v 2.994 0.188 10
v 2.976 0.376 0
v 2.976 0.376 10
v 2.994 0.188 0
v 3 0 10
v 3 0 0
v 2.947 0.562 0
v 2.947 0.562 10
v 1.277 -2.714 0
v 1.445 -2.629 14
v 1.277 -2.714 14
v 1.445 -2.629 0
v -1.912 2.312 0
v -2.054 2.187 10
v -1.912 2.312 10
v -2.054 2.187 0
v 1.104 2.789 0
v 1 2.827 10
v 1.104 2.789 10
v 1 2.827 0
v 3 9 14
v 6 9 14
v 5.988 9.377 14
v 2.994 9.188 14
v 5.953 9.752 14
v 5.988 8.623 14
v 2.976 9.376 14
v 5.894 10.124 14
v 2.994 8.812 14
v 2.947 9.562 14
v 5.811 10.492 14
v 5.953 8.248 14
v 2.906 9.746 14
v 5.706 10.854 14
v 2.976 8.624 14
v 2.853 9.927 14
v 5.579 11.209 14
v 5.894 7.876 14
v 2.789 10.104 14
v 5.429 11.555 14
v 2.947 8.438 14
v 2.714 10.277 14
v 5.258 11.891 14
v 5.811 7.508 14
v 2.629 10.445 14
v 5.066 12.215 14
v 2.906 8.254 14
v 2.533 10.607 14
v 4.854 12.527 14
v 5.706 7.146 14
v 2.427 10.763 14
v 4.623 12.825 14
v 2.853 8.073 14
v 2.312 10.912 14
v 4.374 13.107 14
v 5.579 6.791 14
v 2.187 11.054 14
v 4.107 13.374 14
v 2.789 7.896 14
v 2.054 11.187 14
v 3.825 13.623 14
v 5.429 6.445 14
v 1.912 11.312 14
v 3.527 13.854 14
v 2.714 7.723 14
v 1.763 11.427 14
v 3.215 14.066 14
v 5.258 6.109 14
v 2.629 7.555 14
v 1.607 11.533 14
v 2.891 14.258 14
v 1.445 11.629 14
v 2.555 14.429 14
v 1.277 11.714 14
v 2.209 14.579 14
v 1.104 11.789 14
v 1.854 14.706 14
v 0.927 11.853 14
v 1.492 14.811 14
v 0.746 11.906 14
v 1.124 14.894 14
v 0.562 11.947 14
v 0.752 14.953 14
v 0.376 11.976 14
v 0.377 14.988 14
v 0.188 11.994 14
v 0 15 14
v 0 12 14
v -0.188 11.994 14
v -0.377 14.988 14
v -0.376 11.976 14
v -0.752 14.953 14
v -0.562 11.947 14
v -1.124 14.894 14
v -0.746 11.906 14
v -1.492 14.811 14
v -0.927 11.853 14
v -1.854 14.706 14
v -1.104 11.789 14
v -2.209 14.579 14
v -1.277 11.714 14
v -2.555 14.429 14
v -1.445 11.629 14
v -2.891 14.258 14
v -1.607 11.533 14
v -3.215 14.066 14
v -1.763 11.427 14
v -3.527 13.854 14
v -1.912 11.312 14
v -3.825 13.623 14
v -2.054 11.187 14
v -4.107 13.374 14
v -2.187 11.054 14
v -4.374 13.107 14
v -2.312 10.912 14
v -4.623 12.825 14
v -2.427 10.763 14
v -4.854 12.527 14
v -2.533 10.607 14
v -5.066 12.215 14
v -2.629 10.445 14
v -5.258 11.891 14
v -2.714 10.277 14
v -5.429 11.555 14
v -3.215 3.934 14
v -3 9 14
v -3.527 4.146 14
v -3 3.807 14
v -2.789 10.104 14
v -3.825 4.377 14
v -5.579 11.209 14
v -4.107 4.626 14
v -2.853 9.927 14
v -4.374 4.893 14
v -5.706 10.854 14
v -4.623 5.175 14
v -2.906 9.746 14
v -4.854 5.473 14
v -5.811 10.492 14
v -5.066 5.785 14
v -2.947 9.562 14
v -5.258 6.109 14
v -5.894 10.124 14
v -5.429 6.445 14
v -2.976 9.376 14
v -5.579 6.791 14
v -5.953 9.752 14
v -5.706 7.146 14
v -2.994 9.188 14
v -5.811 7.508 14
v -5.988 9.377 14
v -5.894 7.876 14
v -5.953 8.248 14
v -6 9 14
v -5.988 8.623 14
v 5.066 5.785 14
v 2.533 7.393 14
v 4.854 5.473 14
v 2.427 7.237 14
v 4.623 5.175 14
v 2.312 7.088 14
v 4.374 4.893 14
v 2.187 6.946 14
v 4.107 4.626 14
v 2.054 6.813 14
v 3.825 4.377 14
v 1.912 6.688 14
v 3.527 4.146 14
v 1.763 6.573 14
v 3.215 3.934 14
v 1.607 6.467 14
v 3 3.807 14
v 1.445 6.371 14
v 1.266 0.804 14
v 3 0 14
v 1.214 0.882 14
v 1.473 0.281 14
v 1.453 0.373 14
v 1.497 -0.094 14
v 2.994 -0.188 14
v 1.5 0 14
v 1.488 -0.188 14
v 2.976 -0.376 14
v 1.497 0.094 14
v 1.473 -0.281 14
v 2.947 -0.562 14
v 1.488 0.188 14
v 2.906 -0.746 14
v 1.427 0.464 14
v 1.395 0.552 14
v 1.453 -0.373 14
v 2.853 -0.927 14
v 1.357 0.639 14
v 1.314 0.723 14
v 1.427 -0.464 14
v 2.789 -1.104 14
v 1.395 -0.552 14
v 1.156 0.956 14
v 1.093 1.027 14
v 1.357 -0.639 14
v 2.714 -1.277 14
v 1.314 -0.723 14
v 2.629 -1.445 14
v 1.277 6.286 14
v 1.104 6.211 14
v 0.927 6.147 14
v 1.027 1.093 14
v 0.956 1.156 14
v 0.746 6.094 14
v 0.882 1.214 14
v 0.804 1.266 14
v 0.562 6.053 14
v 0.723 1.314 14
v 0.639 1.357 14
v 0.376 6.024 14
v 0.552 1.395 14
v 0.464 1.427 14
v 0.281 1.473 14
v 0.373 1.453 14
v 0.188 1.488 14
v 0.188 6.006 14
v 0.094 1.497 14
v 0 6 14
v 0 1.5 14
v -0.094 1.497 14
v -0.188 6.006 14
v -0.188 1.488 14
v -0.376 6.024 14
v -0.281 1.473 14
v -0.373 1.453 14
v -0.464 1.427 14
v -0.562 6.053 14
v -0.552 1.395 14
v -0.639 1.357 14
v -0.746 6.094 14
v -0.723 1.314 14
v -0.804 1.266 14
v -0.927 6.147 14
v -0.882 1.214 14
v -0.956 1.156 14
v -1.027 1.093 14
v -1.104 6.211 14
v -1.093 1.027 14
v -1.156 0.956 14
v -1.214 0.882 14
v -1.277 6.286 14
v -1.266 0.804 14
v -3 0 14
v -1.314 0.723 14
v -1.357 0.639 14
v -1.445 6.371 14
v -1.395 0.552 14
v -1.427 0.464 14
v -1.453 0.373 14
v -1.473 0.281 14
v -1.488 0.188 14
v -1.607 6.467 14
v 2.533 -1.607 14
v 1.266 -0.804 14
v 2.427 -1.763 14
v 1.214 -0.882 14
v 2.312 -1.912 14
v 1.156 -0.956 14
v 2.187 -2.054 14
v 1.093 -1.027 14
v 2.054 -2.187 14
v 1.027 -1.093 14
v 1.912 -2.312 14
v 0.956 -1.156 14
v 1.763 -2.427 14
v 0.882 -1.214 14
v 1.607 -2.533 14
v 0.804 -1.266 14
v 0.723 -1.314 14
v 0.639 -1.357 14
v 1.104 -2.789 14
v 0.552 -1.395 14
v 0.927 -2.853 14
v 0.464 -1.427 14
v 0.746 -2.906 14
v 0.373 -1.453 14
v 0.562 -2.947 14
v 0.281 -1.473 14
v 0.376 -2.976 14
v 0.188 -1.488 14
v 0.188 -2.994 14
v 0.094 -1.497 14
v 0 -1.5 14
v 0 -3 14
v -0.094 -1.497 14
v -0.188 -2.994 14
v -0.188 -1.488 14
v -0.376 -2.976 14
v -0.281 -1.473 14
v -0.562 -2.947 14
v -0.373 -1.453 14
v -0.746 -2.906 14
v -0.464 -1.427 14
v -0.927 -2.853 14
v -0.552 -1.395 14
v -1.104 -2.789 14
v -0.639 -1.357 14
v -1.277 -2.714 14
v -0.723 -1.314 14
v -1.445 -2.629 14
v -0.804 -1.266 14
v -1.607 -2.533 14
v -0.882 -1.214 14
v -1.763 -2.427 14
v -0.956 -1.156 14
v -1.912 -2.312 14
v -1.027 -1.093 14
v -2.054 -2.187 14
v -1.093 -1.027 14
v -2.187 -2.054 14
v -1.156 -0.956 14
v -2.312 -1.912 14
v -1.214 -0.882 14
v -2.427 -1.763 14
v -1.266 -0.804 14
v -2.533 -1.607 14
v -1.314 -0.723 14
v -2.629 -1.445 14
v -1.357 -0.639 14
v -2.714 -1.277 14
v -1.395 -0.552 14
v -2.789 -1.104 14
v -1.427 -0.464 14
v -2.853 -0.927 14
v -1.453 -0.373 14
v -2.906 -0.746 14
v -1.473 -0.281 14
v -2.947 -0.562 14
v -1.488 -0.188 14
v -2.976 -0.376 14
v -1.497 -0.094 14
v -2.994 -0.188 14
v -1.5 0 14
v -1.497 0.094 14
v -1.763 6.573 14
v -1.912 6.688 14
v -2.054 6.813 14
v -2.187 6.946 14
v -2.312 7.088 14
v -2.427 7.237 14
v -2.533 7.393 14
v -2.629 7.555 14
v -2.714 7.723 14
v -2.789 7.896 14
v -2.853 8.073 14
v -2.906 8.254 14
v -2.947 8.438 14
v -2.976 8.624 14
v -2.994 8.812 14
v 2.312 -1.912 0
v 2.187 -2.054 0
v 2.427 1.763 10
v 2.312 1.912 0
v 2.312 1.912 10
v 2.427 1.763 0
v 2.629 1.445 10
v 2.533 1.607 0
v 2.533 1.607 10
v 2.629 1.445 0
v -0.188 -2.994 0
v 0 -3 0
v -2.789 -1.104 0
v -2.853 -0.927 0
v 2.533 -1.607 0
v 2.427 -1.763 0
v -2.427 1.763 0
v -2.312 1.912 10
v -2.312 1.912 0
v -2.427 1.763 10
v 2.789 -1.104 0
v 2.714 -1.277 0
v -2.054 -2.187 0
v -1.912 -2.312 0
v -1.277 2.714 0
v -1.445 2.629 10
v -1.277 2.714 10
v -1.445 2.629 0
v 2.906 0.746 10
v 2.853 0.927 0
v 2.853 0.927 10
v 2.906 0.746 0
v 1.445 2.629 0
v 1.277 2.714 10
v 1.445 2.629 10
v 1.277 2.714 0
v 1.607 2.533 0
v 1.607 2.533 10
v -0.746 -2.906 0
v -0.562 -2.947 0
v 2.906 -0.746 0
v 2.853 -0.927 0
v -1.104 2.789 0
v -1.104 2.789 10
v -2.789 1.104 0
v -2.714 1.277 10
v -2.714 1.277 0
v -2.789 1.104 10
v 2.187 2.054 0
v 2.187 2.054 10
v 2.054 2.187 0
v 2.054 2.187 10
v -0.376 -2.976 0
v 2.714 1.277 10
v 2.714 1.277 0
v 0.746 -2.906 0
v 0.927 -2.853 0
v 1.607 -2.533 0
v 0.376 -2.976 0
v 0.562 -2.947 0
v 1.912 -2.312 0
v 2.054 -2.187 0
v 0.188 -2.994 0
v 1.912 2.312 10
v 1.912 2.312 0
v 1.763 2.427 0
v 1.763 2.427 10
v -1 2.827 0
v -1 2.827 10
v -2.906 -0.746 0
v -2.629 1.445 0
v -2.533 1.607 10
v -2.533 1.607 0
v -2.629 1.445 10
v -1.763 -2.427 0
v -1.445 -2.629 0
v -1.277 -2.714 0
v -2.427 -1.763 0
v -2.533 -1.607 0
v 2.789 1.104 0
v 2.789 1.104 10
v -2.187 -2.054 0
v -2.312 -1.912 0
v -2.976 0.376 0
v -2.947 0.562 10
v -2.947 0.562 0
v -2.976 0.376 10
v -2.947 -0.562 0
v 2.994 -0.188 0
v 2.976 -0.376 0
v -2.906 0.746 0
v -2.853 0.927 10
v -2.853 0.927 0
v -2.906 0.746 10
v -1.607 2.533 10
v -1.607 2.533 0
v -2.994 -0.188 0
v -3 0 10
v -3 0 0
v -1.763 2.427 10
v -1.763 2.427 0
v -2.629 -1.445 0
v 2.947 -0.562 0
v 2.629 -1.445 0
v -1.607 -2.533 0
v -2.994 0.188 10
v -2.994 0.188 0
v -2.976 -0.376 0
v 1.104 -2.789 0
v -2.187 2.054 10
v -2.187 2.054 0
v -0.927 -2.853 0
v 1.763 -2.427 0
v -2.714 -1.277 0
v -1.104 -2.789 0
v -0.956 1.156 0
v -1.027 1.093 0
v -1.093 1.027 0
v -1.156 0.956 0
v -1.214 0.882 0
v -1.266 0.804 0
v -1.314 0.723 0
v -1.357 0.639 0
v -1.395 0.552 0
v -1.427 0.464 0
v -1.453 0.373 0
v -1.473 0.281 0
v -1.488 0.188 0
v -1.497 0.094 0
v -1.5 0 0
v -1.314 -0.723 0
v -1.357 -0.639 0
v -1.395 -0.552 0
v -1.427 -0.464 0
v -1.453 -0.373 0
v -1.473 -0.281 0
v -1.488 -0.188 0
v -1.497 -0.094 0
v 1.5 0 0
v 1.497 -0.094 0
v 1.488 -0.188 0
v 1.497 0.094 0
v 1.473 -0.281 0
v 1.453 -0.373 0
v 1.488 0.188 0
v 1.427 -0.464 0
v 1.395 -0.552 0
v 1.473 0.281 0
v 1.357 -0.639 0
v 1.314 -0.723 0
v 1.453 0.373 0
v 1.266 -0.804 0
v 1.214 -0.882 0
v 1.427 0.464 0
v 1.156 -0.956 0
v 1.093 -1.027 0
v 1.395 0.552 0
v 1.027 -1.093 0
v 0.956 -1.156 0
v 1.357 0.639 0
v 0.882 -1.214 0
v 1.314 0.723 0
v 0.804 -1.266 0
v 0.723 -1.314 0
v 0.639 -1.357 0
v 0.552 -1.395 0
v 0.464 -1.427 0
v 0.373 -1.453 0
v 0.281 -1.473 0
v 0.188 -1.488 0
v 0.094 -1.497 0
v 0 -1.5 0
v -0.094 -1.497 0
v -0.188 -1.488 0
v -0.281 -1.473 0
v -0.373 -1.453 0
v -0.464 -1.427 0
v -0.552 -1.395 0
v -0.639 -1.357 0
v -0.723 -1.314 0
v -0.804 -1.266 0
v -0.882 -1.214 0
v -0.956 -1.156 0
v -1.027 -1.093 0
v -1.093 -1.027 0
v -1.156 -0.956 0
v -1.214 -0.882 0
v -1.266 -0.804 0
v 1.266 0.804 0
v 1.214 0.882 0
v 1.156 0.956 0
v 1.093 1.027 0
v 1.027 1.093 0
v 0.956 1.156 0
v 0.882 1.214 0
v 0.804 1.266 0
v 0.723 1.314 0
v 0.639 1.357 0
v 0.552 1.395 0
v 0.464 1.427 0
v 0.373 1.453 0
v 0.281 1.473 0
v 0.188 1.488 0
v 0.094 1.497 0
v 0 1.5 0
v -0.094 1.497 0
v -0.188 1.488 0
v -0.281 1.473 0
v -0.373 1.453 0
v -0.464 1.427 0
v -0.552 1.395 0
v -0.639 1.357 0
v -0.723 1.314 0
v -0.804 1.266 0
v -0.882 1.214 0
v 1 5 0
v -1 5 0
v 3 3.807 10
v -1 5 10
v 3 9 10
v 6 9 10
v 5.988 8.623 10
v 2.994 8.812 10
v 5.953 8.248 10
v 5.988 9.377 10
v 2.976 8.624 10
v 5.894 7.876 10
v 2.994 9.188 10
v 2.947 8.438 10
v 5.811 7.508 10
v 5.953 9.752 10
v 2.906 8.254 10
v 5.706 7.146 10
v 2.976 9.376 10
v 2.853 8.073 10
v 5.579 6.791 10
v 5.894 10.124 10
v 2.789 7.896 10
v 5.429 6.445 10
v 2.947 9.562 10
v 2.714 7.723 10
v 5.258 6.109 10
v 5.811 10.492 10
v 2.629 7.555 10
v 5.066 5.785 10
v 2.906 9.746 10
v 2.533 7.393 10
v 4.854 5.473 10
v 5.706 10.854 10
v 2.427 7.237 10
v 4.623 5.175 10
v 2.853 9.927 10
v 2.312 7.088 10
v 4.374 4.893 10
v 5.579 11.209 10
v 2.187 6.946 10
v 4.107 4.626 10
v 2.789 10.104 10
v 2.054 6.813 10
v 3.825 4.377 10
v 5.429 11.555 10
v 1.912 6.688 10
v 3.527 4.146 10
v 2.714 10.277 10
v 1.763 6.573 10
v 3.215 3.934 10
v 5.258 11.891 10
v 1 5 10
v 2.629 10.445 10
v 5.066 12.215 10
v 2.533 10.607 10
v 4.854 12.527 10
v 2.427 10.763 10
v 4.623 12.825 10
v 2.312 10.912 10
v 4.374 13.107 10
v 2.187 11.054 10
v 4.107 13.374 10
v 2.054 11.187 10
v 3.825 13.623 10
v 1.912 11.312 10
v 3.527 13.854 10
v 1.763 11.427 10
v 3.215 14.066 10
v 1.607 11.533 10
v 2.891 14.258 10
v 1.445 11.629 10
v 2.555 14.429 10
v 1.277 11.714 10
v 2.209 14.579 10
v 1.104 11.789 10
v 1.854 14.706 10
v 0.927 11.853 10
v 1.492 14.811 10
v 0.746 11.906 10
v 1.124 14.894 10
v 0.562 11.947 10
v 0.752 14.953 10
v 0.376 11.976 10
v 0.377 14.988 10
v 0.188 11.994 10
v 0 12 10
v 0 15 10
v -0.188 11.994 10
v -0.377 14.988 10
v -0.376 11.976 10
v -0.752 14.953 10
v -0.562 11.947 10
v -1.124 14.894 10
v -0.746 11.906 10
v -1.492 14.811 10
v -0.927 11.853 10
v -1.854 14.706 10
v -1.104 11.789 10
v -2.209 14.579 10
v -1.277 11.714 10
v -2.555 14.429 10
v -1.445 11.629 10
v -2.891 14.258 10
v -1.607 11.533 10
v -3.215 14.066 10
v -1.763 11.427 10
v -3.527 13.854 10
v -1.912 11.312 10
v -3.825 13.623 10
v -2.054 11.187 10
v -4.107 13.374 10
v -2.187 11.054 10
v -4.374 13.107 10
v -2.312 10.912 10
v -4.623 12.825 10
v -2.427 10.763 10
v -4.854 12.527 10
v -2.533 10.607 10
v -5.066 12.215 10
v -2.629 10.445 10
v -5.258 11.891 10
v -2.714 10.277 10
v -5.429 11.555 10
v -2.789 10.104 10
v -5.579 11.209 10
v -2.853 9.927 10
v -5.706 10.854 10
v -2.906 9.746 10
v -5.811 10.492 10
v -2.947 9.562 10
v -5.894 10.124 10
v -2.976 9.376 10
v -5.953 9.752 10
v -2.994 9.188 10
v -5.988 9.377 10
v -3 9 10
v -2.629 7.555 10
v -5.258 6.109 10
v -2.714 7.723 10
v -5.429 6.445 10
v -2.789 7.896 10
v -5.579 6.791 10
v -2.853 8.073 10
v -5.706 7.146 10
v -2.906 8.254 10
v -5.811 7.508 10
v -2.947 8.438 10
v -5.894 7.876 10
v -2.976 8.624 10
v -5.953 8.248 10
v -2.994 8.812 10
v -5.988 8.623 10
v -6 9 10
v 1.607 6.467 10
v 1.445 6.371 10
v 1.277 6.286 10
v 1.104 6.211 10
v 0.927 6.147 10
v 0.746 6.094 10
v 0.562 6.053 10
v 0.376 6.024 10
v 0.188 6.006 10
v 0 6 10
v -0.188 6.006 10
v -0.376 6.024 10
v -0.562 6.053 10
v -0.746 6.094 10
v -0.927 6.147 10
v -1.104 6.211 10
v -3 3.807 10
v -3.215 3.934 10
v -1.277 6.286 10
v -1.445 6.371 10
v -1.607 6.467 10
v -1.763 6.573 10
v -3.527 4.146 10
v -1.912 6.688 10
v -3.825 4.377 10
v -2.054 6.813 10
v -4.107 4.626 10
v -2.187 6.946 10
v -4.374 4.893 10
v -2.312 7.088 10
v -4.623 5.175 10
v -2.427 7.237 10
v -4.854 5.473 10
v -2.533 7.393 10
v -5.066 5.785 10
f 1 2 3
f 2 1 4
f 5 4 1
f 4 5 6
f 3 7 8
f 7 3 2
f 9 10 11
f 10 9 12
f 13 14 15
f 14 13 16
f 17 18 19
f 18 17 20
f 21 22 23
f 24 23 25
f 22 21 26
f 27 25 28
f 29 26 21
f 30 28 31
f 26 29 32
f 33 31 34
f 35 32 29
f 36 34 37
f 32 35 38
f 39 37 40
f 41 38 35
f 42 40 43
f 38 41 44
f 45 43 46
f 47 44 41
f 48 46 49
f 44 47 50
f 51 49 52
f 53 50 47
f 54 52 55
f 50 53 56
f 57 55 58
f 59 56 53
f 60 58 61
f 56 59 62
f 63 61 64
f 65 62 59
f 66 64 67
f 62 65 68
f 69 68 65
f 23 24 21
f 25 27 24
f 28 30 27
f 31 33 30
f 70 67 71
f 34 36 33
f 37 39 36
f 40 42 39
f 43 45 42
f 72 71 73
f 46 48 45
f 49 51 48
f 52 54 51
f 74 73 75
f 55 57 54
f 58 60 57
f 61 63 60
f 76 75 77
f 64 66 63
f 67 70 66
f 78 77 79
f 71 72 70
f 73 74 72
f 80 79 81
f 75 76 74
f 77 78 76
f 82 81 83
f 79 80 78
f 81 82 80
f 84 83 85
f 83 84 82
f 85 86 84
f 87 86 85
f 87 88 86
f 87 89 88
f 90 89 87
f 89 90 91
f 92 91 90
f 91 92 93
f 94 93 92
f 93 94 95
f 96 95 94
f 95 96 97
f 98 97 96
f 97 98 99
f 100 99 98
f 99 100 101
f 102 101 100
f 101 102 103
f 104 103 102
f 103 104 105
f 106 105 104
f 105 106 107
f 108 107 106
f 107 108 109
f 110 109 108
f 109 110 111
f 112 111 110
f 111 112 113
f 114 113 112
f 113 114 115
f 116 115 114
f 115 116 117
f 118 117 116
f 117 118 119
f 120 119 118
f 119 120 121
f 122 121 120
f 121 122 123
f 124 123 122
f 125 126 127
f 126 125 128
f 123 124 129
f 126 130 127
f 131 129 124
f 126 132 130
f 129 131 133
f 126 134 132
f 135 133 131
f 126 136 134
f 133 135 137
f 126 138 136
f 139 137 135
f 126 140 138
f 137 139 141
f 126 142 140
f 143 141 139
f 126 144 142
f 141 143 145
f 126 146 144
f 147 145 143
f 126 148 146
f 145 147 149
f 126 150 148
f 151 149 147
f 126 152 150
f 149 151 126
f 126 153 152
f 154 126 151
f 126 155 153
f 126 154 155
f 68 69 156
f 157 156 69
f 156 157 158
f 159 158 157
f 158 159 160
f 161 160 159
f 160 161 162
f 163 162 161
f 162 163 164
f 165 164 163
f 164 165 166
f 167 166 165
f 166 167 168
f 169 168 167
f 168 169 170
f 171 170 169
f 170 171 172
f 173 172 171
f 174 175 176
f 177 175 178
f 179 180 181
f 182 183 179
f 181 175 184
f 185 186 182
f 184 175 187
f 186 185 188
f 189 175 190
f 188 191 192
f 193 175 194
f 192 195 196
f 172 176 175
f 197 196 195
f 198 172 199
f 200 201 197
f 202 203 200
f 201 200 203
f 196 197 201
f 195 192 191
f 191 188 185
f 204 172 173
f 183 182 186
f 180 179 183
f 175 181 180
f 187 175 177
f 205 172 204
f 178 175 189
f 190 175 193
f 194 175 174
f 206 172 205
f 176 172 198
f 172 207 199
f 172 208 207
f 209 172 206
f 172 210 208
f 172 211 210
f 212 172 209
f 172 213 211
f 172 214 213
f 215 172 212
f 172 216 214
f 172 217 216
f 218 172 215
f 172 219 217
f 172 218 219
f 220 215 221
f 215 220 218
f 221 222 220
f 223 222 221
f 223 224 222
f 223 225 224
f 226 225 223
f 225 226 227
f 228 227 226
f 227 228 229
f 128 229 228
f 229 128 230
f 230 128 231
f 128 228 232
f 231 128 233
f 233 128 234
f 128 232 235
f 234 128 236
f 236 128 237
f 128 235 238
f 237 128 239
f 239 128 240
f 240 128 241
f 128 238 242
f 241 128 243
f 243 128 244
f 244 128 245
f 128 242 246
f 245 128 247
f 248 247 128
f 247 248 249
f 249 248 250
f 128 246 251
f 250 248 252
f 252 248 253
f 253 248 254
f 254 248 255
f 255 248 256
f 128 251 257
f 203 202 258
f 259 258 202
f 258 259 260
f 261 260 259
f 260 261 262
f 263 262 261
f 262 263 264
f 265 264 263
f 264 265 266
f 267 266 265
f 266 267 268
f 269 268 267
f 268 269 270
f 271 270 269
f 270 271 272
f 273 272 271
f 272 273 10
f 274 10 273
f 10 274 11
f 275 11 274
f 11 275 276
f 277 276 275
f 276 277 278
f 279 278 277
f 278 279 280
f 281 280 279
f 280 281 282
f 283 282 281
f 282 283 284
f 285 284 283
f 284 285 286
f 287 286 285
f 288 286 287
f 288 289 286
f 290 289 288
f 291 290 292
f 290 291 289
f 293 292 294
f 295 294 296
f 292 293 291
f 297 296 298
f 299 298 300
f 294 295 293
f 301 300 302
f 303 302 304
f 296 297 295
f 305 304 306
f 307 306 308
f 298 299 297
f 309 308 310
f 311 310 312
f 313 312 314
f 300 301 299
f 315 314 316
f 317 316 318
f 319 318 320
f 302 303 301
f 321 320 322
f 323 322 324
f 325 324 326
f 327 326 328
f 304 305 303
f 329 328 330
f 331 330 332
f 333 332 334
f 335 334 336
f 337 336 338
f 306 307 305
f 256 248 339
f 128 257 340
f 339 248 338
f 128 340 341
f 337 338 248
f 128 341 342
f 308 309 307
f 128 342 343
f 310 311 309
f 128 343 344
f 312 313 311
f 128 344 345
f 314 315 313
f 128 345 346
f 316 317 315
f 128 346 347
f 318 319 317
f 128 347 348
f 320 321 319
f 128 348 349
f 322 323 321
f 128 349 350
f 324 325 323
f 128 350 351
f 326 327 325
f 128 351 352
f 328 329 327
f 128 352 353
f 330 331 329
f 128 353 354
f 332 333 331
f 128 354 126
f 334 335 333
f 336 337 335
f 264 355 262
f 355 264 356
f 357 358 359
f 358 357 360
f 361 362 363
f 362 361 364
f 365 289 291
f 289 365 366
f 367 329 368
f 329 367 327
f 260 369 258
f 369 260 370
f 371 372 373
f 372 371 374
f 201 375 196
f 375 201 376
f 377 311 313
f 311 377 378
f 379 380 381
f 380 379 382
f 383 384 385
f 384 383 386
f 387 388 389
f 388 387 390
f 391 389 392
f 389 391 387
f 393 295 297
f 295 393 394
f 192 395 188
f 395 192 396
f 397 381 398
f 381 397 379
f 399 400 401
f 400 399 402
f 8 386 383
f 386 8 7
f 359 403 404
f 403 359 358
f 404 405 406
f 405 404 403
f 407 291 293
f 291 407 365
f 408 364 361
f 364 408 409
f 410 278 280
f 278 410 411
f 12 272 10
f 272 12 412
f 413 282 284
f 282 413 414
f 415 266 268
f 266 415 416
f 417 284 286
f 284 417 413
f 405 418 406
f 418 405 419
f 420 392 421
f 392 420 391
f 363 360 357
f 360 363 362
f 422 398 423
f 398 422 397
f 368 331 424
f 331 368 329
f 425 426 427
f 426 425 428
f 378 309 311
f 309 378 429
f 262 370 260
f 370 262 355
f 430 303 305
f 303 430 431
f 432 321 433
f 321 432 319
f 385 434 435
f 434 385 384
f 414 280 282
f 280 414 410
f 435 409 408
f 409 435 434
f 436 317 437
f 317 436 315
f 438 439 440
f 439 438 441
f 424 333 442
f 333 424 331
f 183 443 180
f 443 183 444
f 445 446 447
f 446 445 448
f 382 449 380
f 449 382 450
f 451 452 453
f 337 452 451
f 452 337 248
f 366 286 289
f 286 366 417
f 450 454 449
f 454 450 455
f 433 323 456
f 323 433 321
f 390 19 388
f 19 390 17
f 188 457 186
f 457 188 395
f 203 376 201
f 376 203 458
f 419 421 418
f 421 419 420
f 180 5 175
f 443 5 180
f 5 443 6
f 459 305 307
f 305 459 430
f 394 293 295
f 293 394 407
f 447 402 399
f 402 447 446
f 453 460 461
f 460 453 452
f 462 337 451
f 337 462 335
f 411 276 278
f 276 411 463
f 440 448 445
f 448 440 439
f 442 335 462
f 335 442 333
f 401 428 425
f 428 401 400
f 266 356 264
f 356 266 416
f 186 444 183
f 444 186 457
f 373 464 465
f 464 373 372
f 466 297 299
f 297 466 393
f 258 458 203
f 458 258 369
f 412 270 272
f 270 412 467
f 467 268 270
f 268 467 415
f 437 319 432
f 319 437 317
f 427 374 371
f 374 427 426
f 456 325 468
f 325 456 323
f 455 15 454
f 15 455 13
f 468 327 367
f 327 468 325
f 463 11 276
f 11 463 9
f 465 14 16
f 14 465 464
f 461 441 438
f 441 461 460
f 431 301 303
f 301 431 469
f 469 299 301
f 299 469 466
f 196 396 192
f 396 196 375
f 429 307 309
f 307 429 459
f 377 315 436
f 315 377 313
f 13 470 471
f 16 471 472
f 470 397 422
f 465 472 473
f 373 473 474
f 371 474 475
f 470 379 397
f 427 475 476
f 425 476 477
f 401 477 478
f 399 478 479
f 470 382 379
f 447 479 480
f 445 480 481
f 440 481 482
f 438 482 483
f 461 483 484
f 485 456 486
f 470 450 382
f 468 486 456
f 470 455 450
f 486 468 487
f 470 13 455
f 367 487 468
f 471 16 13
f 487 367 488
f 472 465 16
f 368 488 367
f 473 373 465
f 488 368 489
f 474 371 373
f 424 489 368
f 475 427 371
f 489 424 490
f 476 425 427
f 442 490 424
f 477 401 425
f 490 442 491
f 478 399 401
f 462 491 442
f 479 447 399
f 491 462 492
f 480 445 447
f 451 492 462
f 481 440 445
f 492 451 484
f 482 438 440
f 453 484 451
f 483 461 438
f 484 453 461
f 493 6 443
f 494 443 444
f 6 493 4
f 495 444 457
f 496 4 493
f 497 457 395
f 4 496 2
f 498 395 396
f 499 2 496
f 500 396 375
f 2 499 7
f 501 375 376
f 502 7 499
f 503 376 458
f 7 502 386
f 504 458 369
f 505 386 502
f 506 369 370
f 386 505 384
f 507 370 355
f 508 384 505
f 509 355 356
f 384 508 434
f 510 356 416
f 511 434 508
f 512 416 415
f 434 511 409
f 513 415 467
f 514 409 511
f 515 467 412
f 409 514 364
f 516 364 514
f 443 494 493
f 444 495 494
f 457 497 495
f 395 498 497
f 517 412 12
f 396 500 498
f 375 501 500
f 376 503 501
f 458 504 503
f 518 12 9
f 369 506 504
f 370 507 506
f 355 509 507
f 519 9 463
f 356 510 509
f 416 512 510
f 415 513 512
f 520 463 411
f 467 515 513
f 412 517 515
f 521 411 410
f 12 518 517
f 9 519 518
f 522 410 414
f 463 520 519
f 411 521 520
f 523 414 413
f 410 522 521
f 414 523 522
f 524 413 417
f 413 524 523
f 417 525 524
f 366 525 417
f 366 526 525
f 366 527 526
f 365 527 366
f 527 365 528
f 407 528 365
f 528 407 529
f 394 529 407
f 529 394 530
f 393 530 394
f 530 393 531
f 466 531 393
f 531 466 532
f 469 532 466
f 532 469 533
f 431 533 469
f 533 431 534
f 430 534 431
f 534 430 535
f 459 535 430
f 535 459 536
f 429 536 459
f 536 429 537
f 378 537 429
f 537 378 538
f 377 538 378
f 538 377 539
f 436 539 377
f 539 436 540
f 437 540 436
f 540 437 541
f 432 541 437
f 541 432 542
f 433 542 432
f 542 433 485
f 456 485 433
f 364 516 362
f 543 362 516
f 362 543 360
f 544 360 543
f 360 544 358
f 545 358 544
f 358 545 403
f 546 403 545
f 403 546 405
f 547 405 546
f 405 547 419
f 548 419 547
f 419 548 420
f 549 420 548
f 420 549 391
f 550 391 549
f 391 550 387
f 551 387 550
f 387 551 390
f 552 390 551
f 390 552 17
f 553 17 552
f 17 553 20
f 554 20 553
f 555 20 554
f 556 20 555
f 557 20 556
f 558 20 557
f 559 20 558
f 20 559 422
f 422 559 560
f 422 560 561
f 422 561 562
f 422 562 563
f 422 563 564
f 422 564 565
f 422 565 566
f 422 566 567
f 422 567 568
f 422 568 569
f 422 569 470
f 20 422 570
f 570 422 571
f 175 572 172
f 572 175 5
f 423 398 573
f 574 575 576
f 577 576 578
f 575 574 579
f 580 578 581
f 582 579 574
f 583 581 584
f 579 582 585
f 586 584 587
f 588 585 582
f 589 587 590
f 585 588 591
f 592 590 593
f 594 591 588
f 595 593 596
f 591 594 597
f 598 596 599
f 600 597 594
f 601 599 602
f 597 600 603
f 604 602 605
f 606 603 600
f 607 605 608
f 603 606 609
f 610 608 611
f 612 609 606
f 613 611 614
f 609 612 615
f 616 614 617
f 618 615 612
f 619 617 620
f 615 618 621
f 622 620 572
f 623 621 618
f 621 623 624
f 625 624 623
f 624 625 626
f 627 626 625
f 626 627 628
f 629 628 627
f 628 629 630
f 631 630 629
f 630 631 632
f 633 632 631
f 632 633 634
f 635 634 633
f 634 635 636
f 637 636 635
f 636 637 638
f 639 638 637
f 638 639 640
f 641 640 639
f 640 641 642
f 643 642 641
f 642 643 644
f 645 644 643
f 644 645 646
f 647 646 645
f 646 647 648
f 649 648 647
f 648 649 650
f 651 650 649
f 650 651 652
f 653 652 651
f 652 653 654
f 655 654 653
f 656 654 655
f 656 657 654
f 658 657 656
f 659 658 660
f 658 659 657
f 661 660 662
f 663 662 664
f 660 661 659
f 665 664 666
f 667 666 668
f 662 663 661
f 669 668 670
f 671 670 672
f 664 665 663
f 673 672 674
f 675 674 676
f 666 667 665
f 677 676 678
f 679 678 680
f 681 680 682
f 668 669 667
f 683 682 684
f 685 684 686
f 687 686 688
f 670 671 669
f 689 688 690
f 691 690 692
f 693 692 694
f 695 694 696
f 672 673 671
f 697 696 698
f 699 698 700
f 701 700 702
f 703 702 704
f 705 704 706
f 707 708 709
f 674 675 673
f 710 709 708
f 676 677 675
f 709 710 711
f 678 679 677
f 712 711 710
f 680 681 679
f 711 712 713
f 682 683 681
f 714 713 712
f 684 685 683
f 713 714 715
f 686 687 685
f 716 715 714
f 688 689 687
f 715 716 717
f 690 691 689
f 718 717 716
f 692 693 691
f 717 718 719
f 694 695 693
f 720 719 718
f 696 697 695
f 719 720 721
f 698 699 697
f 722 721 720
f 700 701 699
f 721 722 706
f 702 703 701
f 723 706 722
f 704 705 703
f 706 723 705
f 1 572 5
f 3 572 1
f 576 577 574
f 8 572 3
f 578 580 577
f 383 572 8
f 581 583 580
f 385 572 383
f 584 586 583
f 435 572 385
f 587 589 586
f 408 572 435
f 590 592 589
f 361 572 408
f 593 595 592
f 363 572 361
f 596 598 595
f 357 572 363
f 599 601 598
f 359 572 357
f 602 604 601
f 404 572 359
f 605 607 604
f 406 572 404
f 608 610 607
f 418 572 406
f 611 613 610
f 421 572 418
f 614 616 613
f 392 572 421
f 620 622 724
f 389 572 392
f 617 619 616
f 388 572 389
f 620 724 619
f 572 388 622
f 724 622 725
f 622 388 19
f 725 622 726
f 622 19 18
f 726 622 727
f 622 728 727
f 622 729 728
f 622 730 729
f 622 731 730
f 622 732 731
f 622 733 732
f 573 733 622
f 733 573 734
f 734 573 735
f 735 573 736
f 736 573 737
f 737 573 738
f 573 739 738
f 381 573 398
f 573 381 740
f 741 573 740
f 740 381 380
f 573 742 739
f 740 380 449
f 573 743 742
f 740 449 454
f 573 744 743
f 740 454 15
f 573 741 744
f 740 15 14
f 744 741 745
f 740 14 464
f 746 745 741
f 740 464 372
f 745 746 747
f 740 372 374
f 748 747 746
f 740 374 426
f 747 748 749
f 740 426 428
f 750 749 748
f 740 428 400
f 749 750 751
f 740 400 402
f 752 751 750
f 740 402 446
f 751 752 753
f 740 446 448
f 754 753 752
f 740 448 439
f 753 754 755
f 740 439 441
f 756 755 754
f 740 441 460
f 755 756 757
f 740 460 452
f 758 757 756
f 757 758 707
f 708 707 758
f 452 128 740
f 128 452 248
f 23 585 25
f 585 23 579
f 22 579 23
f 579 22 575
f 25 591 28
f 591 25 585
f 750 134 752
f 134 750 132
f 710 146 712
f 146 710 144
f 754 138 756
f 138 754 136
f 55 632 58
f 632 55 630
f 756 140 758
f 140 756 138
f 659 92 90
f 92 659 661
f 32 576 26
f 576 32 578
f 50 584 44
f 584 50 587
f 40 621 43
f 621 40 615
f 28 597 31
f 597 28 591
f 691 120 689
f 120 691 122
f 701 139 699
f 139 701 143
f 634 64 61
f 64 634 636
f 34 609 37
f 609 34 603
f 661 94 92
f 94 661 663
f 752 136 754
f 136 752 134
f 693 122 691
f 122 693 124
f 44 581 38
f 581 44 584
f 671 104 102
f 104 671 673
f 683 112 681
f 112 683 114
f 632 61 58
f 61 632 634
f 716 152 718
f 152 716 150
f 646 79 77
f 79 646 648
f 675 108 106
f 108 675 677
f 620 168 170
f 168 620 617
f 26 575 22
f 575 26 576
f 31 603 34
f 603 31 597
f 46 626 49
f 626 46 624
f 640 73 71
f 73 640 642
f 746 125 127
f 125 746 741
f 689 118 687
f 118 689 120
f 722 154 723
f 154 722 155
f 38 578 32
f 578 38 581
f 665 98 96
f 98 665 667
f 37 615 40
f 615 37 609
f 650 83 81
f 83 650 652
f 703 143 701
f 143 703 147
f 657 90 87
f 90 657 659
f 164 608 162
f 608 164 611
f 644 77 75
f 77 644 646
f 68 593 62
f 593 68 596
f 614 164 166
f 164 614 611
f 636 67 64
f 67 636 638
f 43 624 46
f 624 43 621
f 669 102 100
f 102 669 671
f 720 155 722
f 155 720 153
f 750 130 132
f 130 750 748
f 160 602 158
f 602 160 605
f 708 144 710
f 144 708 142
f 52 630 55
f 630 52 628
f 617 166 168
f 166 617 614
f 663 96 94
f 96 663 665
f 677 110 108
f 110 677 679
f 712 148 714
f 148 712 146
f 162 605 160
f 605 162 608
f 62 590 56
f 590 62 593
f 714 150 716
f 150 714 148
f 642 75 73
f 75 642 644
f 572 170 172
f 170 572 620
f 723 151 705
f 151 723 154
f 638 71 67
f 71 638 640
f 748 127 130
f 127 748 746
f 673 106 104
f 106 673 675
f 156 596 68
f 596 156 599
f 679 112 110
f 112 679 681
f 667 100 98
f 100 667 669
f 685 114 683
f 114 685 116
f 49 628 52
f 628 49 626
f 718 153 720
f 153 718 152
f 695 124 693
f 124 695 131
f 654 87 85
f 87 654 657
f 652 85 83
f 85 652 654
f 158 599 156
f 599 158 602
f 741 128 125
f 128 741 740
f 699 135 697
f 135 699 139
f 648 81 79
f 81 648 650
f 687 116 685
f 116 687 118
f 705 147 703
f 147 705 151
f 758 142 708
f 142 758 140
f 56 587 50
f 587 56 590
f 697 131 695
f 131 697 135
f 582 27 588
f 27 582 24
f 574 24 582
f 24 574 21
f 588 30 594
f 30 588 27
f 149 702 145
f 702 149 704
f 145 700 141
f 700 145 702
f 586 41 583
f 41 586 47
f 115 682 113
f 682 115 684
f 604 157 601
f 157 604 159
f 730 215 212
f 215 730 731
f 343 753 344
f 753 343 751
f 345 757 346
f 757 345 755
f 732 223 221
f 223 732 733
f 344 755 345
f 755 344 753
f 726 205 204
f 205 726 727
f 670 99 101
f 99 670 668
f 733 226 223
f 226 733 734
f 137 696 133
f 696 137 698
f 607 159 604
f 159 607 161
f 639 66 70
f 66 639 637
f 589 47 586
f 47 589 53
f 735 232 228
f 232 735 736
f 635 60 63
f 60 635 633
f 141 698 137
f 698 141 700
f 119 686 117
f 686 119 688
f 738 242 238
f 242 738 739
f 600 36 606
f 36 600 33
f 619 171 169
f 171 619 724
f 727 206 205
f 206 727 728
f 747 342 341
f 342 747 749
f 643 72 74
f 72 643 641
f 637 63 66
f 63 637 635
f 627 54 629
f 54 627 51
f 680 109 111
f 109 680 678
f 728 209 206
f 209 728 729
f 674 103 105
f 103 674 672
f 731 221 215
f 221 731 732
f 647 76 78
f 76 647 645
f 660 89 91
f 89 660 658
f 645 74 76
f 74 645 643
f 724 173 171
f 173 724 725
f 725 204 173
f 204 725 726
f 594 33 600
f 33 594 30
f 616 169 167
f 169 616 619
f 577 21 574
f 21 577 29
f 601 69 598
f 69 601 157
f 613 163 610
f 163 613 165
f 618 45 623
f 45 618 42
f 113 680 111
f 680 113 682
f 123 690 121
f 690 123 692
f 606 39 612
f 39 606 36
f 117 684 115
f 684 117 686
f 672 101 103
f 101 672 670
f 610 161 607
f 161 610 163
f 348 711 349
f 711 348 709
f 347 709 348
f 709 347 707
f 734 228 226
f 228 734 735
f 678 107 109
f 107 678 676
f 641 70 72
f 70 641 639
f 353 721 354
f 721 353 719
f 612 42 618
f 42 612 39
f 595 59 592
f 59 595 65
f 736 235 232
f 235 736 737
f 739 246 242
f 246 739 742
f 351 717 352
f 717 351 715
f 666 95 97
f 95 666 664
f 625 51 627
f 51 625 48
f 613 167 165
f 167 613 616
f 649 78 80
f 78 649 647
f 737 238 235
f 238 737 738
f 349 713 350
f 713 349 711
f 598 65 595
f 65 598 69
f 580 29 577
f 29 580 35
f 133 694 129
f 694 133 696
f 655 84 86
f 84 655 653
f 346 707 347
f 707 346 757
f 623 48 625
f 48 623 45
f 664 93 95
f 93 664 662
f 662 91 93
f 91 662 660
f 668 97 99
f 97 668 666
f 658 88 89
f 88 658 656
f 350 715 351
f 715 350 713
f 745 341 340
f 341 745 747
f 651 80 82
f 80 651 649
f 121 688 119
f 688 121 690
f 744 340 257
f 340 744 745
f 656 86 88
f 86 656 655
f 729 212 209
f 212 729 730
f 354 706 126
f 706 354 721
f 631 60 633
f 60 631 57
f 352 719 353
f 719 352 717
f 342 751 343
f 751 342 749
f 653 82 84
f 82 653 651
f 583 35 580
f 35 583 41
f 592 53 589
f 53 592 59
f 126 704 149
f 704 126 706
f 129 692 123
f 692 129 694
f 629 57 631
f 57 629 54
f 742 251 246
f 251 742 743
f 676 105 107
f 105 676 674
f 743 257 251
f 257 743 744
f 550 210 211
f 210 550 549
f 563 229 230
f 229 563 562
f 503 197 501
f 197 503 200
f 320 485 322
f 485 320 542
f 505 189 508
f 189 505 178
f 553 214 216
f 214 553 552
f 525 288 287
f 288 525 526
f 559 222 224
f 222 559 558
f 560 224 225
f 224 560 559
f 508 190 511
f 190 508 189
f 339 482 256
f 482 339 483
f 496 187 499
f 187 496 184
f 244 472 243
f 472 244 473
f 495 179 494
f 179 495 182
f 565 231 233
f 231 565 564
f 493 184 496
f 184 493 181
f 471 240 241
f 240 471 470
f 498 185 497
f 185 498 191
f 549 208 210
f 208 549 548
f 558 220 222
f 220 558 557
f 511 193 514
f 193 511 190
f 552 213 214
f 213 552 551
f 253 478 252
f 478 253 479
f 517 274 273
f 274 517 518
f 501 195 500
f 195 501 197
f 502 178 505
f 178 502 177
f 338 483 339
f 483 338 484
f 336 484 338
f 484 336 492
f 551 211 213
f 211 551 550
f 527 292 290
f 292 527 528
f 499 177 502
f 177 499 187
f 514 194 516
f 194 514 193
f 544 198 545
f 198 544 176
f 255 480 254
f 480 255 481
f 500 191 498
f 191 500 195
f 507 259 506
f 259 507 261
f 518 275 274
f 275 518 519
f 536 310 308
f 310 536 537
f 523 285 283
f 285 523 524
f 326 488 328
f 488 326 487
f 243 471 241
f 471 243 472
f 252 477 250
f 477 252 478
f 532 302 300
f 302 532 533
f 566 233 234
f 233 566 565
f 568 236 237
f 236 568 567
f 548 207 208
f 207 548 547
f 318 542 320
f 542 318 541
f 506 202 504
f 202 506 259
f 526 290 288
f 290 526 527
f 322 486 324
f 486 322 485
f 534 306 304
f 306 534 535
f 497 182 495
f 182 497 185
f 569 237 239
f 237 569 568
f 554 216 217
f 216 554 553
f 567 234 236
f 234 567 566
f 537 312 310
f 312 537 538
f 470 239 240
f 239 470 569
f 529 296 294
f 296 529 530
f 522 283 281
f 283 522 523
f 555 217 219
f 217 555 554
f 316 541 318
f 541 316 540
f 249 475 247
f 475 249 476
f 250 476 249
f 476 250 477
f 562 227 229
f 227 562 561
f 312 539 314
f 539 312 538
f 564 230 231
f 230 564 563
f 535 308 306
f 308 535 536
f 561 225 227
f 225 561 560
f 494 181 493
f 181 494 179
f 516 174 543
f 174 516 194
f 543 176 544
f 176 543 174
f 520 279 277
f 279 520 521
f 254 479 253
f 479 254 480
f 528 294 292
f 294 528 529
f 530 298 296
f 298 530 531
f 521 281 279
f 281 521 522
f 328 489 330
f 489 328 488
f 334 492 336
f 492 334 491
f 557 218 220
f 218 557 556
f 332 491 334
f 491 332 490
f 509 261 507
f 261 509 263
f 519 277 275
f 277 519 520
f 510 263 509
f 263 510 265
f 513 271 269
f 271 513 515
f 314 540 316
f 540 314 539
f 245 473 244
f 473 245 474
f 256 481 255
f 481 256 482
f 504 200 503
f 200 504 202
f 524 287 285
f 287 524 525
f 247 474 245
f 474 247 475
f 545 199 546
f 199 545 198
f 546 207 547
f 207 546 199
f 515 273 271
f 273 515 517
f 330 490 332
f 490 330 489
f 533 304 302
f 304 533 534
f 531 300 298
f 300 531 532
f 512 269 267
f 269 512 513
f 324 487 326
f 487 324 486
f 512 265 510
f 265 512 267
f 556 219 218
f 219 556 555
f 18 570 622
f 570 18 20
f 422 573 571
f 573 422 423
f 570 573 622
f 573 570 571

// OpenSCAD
epsilon=.01;

barrel_d=6;
barrel_r=barrel_d/2;
barrel_h=10;
bracket_h=4;
housing_margin = 3;
housing_i_d = 6;
housing_i_r = housing_i_d/2;
housing_o_r = housing_i_r + housing_margin;
screw_d=3;
screw_r=screw_d/2;
connector_l = barrel_r+housing_o_r;
notch_l=2;
notch_w=2;
notch_overlap=(barrel_r-screw_r)/2;

module epsilon_z() {
	translate([0, 0, -epsilon/2]) children();
}

module bracket() {
	difference() {
		union() {
			cylinder(r=barrel_r, h=barrel_h+bracket_h);
			translate([-barrel_r, 0, barrel_h])
				cube(size=[2*barrel_r, connector_l, bracket_h]);
			translate([0, connector_l, barrel_h])
				cylinder(r=housing_o_r, h=bracket_h);
		}
		translate([0, connector_l, barrel_h])
			epsilon_z()
			cylinder(r=housing_i_r, h=bracket_h+epsilon);
		epsilon_z()
			cylinder(r=screw_r, h=barrel_h+bracket_h+epsilon);
	}
	
}

$fn=100;
bracket();
	translate([-notch_w/2, barrel_r-notch_overlap, 0])
			cube(size=[notch_w, notch_l+notch_overlap, barrel_h]);
